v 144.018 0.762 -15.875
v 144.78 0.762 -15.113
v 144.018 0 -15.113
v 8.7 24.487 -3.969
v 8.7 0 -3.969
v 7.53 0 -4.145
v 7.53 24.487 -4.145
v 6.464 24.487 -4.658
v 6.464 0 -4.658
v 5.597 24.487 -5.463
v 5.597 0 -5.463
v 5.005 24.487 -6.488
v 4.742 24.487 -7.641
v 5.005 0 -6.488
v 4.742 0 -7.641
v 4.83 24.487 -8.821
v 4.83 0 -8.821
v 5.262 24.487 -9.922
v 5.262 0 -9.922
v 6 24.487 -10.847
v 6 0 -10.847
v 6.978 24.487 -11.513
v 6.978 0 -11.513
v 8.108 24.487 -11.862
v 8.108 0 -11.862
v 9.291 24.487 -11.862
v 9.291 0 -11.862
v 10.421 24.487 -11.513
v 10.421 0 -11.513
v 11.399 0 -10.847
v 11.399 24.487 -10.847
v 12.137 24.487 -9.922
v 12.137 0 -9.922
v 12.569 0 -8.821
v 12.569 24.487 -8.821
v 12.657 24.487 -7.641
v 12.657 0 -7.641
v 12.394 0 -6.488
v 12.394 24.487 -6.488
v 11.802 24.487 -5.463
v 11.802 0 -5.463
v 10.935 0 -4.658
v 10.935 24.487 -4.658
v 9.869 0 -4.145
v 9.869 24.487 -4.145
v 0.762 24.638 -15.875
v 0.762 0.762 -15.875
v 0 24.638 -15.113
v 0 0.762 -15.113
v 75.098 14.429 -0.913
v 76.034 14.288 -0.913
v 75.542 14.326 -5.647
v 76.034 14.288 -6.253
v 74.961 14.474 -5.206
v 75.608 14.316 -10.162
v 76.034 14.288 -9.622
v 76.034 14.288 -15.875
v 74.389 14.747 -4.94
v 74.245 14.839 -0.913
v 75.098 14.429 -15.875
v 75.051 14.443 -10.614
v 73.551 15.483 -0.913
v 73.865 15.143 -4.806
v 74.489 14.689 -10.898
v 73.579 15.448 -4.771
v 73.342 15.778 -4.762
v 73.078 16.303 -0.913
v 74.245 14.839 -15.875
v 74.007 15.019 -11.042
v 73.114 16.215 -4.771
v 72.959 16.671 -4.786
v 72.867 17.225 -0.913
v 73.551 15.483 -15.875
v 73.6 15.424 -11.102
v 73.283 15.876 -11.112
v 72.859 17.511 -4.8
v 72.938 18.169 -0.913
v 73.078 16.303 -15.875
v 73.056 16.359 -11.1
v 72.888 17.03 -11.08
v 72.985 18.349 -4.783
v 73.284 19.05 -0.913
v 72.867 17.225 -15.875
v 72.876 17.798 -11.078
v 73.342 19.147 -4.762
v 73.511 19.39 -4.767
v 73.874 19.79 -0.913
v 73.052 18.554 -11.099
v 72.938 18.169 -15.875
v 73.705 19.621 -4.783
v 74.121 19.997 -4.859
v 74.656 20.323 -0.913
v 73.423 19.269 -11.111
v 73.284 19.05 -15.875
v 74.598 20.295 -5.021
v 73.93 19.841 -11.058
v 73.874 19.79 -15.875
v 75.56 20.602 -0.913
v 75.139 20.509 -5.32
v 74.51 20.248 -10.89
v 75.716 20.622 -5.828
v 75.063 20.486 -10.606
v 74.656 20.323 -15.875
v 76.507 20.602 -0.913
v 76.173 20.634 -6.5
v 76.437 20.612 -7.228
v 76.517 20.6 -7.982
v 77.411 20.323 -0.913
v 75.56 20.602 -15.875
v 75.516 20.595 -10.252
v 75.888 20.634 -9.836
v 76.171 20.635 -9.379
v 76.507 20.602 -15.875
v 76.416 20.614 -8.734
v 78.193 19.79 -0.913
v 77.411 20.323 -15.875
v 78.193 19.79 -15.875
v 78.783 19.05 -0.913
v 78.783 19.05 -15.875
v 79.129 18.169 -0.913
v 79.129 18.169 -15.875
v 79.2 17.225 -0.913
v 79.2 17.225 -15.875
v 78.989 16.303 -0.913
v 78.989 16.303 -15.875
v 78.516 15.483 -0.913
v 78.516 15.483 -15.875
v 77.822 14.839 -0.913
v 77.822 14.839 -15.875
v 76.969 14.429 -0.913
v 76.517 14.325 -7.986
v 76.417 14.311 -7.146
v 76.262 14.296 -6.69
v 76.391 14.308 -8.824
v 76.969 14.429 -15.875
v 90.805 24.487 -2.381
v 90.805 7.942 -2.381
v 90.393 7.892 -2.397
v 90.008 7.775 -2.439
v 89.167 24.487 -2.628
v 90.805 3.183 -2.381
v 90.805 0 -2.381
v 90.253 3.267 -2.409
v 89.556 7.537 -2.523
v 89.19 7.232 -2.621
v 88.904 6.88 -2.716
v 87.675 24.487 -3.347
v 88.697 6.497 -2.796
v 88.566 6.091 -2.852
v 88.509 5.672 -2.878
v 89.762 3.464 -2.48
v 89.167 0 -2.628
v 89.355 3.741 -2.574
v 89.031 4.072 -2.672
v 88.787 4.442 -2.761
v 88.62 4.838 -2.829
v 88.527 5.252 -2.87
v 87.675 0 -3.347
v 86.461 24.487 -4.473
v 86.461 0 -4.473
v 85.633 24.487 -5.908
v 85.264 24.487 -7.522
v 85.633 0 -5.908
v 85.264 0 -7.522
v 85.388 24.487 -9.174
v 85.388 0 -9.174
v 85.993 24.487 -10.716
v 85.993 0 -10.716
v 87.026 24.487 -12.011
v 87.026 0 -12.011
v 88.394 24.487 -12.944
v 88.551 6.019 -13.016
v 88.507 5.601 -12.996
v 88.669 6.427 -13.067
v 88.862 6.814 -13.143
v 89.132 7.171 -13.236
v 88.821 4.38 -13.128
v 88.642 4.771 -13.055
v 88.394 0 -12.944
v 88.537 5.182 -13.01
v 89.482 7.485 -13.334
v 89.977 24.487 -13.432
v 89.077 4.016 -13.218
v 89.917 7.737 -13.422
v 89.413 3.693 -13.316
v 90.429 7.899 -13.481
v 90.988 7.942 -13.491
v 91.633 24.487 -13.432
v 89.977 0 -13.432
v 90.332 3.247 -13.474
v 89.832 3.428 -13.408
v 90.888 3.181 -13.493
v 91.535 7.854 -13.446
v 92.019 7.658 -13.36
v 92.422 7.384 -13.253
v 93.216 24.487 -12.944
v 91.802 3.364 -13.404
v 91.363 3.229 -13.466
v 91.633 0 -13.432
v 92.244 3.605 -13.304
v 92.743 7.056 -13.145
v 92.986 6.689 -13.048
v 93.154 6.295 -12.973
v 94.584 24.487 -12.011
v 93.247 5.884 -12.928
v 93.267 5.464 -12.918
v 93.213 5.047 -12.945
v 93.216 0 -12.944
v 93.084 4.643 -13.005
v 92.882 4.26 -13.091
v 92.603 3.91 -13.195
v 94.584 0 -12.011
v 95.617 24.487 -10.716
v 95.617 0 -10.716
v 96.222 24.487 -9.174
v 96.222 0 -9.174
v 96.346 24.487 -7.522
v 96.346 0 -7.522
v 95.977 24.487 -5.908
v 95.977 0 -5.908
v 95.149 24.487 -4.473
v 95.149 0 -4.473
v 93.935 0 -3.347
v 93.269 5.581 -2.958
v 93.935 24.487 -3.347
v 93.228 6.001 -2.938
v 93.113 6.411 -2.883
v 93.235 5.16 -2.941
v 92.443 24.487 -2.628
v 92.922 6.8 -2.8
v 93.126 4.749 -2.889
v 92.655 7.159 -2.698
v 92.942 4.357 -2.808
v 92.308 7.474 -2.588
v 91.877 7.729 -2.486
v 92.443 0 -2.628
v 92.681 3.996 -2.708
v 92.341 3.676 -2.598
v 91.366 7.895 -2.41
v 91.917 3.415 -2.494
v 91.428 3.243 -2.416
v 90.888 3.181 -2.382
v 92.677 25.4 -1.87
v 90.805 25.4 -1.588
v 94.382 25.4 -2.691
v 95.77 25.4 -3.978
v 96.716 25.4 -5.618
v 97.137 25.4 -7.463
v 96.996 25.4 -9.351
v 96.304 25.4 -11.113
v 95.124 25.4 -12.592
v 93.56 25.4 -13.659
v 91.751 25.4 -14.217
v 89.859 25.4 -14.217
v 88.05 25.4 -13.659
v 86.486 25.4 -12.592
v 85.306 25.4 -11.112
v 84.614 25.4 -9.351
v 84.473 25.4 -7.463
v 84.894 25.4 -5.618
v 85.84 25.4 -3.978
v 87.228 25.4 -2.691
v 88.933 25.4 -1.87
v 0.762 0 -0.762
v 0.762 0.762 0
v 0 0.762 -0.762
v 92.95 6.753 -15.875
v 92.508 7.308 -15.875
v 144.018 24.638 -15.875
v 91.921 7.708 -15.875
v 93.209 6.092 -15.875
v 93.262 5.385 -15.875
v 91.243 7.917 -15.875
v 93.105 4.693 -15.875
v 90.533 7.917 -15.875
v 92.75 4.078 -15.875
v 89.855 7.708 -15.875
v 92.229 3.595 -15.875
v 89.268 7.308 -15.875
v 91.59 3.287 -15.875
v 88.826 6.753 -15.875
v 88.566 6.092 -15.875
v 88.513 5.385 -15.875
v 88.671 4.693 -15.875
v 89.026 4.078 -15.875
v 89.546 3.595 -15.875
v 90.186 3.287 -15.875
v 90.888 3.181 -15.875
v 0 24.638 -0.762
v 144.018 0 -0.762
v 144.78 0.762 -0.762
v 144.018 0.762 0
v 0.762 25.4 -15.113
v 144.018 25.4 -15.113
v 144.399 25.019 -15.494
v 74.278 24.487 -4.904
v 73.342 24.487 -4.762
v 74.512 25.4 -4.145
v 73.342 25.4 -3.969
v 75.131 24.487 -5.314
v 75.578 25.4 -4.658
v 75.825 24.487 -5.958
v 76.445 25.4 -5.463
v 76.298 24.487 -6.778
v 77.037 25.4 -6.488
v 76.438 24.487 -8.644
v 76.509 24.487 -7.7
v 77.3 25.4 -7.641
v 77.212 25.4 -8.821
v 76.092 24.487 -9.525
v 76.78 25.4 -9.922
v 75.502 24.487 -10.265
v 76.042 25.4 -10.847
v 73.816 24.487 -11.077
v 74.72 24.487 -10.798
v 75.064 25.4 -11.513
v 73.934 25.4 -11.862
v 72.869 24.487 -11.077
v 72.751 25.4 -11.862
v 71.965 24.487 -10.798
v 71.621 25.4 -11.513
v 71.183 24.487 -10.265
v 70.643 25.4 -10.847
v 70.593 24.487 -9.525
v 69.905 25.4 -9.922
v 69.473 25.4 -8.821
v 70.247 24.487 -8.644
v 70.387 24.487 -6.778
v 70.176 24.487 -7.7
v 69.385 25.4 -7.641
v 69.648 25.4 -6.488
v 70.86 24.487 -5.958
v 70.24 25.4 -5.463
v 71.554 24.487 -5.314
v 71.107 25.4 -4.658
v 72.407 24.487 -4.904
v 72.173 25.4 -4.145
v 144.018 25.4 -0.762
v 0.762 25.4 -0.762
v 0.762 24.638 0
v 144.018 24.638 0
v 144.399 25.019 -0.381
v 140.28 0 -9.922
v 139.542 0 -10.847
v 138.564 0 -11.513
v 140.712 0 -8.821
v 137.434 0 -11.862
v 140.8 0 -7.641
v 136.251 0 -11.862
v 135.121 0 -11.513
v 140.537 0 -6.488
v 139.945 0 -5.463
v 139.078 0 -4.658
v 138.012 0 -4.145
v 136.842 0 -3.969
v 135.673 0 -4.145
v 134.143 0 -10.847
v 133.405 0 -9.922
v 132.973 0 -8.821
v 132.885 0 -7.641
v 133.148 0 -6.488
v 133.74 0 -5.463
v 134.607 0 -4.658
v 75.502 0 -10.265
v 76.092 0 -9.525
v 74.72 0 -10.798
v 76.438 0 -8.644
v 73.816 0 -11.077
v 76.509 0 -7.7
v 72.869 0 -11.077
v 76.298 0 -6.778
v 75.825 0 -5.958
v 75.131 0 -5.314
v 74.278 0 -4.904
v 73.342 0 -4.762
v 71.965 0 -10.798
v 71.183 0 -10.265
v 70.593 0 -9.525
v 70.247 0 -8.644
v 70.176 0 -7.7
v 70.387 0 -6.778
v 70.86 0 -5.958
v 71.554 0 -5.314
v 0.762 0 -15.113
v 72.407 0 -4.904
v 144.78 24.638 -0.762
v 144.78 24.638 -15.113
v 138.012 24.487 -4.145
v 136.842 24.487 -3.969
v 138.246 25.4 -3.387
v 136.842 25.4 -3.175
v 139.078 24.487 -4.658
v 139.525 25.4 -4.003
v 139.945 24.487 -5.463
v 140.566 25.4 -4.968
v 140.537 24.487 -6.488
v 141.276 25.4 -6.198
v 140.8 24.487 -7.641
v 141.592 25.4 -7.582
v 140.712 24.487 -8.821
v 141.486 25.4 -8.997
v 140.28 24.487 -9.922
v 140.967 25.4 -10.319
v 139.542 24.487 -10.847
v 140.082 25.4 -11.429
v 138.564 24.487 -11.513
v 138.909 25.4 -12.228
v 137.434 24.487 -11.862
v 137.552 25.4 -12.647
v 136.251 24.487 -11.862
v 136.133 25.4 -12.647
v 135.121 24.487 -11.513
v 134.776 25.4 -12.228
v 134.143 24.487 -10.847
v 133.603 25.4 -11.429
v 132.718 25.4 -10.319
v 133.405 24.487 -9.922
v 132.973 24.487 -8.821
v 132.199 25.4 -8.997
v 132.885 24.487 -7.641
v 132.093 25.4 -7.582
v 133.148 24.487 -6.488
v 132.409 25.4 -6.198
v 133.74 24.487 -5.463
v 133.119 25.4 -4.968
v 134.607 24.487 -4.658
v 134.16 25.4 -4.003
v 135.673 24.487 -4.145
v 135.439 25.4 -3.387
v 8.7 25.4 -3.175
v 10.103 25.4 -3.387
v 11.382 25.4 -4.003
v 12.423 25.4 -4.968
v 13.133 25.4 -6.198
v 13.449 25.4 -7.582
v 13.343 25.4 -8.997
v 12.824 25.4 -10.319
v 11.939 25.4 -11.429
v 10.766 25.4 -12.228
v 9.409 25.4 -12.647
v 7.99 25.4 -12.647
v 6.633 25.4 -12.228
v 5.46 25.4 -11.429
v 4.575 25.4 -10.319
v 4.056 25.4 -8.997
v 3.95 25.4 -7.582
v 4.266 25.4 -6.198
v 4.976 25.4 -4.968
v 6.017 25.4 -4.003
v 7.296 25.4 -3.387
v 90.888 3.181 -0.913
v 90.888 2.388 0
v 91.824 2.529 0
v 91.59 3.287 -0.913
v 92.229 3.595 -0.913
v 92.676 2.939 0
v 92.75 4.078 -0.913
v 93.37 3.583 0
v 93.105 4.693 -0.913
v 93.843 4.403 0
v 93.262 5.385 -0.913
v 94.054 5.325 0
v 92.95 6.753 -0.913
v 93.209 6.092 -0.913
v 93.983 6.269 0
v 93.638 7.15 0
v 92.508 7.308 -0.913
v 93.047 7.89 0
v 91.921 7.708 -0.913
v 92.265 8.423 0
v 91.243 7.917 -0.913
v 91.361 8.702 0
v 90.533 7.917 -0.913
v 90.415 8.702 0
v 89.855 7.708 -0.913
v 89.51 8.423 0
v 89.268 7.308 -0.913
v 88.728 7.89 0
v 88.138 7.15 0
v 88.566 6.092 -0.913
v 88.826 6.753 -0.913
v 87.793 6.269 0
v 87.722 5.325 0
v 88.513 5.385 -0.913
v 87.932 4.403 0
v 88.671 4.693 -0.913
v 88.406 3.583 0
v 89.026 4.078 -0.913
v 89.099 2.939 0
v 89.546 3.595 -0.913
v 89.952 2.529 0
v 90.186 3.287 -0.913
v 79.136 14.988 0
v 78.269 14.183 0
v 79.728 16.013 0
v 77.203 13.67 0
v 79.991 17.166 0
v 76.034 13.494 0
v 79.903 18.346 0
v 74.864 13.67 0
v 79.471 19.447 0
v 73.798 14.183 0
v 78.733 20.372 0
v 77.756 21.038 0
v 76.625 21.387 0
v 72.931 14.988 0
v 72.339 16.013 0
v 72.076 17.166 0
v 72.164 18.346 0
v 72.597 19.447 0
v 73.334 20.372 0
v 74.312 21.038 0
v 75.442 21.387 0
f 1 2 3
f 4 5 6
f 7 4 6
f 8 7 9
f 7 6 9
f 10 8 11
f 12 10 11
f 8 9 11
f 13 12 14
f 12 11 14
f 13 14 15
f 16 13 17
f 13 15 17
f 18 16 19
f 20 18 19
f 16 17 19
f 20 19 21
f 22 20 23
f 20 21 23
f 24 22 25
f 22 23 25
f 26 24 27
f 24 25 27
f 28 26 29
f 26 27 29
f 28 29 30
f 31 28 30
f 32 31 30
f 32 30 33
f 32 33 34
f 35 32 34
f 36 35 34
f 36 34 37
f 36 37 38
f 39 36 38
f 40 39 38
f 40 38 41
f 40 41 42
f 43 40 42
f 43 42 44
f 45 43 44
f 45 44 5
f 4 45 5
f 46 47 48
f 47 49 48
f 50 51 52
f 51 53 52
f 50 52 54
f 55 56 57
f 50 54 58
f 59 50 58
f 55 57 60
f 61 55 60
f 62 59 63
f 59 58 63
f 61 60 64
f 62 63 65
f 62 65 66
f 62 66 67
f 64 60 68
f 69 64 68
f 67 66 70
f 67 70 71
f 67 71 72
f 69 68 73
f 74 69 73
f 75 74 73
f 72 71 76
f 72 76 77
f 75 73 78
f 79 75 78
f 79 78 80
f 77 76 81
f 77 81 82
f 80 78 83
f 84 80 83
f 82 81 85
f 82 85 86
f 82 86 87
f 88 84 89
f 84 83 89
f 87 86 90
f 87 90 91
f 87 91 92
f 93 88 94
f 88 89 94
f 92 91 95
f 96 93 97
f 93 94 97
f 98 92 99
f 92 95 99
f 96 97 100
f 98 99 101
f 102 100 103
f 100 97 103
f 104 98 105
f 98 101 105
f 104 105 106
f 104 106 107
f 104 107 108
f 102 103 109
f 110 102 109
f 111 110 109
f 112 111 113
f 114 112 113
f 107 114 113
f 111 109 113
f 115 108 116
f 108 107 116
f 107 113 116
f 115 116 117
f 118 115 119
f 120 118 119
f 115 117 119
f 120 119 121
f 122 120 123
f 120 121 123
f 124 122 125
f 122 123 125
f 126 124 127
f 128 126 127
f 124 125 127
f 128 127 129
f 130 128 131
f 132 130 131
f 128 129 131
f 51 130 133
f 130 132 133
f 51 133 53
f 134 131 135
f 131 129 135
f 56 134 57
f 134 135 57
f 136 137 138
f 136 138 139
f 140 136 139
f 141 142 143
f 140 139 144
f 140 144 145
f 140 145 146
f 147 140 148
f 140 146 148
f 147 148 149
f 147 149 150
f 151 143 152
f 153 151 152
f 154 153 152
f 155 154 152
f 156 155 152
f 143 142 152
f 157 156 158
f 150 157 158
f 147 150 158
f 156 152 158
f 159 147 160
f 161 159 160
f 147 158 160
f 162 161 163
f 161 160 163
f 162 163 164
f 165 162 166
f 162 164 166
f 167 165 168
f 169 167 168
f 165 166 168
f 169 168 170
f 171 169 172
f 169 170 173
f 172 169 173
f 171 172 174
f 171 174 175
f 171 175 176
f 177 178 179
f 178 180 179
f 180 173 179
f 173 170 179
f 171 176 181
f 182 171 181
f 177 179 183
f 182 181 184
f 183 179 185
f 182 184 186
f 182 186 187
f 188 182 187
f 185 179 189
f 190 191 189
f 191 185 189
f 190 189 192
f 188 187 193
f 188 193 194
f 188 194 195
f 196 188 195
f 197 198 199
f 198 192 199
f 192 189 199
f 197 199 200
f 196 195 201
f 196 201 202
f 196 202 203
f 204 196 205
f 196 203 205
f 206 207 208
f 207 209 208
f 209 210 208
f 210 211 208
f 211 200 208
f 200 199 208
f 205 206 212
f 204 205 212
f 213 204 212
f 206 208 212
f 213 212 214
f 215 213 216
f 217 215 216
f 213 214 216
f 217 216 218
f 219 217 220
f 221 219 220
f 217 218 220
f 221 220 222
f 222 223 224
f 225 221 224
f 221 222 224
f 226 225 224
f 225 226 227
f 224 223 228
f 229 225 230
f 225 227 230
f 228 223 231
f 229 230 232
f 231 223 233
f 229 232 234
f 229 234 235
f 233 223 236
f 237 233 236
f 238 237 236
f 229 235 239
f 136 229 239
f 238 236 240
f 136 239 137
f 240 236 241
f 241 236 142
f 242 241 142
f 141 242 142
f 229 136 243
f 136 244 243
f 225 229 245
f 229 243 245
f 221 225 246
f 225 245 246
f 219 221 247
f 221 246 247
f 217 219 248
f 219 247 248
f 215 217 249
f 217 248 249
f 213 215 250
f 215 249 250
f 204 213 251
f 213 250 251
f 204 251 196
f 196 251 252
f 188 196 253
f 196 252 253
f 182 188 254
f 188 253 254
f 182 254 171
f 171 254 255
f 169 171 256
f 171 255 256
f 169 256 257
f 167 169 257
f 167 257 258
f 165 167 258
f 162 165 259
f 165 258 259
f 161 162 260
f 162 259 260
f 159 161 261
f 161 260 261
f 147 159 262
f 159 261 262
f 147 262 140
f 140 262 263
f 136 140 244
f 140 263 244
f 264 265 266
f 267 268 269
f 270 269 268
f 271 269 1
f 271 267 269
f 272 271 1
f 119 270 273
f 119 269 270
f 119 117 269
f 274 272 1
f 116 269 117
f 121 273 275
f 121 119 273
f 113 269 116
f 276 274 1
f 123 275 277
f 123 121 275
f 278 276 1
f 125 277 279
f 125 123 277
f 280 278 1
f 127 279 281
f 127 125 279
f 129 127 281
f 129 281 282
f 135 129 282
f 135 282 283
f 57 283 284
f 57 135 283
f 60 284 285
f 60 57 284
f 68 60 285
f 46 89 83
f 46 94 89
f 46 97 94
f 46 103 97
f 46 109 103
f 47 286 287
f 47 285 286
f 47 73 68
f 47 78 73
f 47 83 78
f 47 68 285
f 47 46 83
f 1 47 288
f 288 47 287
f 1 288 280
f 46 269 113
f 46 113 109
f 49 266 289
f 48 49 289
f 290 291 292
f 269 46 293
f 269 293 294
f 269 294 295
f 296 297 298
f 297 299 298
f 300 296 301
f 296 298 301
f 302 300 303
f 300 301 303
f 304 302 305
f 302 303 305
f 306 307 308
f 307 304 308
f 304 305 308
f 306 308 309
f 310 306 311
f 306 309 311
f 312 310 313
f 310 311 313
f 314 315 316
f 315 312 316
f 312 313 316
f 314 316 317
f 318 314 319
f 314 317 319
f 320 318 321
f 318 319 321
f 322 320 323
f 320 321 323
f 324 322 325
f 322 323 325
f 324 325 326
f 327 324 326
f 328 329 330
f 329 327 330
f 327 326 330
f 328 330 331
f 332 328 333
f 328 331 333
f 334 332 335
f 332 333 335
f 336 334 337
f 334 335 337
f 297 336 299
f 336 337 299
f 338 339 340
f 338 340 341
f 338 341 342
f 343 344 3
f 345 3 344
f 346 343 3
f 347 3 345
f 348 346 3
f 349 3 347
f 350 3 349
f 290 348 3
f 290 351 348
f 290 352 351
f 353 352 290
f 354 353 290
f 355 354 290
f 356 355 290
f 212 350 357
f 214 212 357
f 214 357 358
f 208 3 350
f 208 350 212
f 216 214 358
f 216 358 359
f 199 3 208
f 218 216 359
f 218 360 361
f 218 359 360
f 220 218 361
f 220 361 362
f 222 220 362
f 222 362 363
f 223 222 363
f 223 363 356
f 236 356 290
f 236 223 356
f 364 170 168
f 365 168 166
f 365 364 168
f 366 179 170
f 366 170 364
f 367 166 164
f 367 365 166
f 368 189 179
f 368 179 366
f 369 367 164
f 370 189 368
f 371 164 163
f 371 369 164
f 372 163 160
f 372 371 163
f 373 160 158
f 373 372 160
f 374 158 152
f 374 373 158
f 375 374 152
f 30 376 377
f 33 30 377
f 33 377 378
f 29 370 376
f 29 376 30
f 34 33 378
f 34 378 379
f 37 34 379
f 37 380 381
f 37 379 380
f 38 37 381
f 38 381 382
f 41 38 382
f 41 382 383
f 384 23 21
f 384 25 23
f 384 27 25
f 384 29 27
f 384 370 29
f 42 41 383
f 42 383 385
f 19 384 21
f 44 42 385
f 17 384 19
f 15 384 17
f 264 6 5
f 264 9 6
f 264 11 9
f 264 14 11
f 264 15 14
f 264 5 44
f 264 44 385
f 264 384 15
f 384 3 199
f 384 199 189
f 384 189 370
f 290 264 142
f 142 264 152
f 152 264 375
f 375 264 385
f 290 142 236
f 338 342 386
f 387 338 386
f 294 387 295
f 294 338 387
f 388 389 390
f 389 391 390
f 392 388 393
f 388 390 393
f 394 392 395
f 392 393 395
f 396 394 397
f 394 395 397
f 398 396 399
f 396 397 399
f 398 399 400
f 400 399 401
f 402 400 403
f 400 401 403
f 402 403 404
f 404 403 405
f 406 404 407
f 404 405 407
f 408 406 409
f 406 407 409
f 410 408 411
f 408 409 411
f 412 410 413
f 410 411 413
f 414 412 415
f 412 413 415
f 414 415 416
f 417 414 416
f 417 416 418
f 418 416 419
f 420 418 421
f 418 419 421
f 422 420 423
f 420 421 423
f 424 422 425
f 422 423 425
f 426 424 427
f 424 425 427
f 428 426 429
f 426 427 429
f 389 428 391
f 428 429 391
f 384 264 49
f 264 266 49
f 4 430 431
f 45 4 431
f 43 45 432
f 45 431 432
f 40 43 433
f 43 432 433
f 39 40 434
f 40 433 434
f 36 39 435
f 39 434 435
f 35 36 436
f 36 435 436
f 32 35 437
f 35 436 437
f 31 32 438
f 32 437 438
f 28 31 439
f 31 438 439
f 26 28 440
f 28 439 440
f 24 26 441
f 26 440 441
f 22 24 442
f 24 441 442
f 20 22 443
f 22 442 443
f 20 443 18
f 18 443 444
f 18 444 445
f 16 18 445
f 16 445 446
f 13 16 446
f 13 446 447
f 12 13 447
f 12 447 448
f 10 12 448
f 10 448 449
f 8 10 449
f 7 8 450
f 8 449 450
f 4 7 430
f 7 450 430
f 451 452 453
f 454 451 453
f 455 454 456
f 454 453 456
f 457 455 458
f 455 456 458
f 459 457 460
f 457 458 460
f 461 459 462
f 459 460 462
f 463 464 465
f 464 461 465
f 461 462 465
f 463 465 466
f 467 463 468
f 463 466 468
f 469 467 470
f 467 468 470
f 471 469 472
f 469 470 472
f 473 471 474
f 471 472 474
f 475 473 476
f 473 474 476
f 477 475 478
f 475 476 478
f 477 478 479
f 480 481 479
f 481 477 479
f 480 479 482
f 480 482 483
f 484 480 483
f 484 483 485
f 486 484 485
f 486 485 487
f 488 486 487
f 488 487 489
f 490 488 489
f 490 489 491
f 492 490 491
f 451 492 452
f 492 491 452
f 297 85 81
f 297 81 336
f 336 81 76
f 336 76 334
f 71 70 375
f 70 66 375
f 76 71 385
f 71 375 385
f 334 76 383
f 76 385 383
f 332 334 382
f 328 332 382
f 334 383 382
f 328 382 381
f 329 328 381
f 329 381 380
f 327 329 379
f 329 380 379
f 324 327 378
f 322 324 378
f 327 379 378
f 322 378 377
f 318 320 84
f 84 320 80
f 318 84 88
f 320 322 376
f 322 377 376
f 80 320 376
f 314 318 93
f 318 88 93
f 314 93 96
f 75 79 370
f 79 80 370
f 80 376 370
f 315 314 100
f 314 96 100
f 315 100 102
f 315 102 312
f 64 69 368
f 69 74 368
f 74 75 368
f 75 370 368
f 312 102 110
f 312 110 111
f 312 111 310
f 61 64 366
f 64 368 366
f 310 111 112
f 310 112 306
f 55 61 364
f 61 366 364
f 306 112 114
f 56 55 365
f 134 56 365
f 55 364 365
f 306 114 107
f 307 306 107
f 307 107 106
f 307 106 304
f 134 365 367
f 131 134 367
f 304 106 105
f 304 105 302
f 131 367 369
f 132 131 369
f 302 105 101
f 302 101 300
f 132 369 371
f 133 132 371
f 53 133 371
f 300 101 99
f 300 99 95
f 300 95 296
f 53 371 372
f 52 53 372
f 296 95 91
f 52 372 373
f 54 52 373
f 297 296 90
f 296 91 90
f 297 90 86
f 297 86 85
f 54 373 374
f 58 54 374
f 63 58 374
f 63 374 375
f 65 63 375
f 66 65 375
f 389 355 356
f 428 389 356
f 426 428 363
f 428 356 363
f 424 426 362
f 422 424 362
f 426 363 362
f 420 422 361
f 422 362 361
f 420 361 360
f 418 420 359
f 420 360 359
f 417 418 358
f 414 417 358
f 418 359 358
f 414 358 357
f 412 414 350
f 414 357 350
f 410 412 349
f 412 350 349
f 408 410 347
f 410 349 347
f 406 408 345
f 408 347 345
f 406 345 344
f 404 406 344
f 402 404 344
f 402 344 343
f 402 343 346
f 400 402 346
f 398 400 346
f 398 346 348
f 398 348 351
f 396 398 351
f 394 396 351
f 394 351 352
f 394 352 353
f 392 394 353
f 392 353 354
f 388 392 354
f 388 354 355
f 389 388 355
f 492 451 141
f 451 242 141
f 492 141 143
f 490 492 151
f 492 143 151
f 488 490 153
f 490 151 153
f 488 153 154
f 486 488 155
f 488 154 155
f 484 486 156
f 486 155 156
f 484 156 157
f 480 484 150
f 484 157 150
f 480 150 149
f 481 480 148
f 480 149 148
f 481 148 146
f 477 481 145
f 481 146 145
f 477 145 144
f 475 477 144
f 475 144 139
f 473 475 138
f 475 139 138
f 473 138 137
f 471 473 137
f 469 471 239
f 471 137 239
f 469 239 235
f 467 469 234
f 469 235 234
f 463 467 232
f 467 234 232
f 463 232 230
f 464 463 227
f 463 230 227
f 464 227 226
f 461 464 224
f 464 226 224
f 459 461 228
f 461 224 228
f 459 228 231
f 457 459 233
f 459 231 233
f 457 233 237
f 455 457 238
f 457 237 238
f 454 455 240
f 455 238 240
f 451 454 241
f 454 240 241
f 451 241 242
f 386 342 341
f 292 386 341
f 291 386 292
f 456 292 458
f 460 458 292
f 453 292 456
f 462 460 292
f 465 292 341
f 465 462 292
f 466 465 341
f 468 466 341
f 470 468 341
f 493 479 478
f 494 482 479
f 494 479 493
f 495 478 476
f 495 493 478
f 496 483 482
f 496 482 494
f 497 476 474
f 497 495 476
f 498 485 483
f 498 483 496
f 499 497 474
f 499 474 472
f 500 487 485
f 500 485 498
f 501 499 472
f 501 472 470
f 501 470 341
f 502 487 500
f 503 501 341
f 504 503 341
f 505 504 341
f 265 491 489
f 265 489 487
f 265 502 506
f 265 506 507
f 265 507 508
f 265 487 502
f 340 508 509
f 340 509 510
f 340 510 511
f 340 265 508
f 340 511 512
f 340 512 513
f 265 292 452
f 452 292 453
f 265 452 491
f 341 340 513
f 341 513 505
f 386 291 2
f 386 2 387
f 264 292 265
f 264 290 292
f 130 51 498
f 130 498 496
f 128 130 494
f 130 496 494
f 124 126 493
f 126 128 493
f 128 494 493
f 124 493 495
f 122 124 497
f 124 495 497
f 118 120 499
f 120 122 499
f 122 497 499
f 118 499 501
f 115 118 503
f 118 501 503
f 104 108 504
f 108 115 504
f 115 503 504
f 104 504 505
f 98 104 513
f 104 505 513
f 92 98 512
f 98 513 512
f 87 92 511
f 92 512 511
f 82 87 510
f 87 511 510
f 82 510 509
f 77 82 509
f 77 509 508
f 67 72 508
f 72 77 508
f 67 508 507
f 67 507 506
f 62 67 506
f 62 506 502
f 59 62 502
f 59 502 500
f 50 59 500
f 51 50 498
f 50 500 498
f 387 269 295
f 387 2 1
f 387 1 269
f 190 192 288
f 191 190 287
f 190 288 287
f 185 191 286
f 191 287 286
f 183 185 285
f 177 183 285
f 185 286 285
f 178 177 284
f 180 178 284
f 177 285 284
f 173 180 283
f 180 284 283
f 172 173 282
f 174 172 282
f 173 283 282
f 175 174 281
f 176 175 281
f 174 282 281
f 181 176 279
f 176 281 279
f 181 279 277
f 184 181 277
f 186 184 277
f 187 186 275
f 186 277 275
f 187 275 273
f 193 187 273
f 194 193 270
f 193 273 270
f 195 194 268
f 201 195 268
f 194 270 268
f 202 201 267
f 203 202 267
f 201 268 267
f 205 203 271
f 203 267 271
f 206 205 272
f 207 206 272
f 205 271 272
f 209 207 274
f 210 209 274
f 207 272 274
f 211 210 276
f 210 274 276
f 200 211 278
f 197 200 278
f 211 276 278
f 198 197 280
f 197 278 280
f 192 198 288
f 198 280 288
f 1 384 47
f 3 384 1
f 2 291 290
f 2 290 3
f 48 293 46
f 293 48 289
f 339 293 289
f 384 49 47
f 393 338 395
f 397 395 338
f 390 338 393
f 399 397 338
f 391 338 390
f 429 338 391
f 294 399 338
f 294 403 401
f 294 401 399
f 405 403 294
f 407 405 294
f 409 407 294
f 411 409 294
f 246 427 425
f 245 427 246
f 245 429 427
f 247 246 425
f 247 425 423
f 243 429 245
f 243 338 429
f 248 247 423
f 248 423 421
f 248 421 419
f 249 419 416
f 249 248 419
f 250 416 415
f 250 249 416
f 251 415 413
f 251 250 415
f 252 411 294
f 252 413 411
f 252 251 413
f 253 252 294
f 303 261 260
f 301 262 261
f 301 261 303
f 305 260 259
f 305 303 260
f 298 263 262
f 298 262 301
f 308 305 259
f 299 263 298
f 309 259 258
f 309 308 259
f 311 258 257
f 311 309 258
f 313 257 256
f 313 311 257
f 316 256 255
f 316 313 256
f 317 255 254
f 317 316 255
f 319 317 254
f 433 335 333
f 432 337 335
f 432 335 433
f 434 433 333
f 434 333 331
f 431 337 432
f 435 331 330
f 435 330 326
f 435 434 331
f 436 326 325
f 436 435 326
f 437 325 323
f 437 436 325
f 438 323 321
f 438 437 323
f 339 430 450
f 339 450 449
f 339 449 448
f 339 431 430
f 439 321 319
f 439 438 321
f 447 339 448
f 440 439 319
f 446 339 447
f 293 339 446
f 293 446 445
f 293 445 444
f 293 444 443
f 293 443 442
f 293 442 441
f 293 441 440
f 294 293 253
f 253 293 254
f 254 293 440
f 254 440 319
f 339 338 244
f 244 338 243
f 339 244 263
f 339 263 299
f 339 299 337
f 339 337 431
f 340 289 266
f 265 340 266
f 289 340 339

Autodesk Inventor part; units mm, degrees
ref_plane "YZ Plane" through (0, 0, 0) normal (1, 0, 0) x (0, 1, 0)
ref_plane "XZ Plane" through (0, 0, 0) normal (0, 1, 0) x (-1, 0, 0)
ref_plane "XY Plane" through (0, 0, 0) normal (0, 0, 1) x (1, 0, 0)
sketch "Sketch1" plane through (0, 0, 0) normal (1, 0, 0) x (0, 1, 0)
  line L0 (0, 0) -> (25.4, 0)
  line L1 (25.4, 0) -> (25.4, -15.875)
  line L2 (25.4, -15.875) -> (0, -15.875)
  line L3 (0, -15.875) -> (0, 0)
  dimension "d0" = 25.4
  dimension "d1" = 15.875
extrude "Extrusion1" add sketch "Sketch1" along normal blind 144.78
chamfer "Chamfer1" distance 0.762 angle 45 11 edges at (144.78, 12.7, 0) (144.78, 12.7, -15.875) (144.78, 0, -7.9375) (72.39, 0, 0) (72.39, 25.4, 0) (72.39, 25.4, -15.875) (0, 12.7, 0) (0, 25.4, -7.9375) (0, 12.7, -15.875) (0, 0, -7.9375) (72.39, 0, -15.875)
sketch "Sketch2" plane through (0.762, 25.4, -15.113) normal (0, 1, 0) x (1, 0, 0)
  line L0 (0, -15.113) -> (143.256, -15.113) projected
  line L1 (0, -15.113) -> (7.9375, -15.113)
  line L2 (7.9375, -15.113) -> (7.9375, -7.1755)
  point P0 (-0.762, -15.113)
  dimension "d7" = 7.9375
  dimension "d8" = 7.9375
hole "Hole1" at (8.6995, 25.4, -7.9375) direction (0, -1, 0) diameter 7.9375 end through all countersink diameter 9.525 countersink angle 82
sketch "Sketch3" plane through (0.762, 25.4, -15.113) normal (0, 1, 0) x (1, 0, 0)
  line L0 (144.018, 0) -> (144.018, -14.351) projected
  line L1 (144.018, -7.1755) -> (72.5805, -7.1755)
  point P0 (-0.762, -15.113)
  dimension "d16" = 71.4375
hole "Hole2" at (73.3425, 25.4, -7.9375) direction (0, -1, 0) diameter 6.35 end through all countersink diameter 7.9375 countersink angle 82
sketch "Sketch4" plane through (0.762, 25.4, -15.113) normal (0, 1, 0) x (1, 0, 0)
  line L0 (144.018, 0) -> (144.018, -14.351) projected
  line L1 (144.018, -7.1755) -> (90.043, -7.1755)
  point P0 (-0.762, -15.113)
  dimension "d24" = 53.975
hole "Hole3" at (90.805, 25.4, -7.9375) direction (0, -1, 0) diameter 11.1125 end through all countersink diameter 12.7 countersink angle 82
sketch "Sketch5" plane through (0.762, 25.4, -15.113) normal (0, 1, 0) x (1, 0, 0)
  line L0 (144.018, 0) -> (144.018, -14.351) projected
  line L1 (144.018, -7.1755) -> (136.0805, -7.1755)
  point P0 (-0.762, -15.113)
  dimension "d32" = 7.9375
hole "Hole4" at (136.8425, 25.4, -7.9375) direction (0, -1, 0) diameter 7.9375 end through all countersink diameter 9.525 countersink angle 82
sketch "Sketch6" plane through (0.762, 0.762, 0) normal (0, 0, 1) x (1, 0, 0)
  line L0 (111.9534, -0.762) -> (111.9534, 4.8006) construction
  line L1 (117.1134, 4.8006) -> (90.1259, 4.8006) construction
  point P0 (-0.762, -0.762)
  dimension "d40" = 5.5626
  dimension "d41" = 26.9875
hole "Hole5" at (90.8879, 5.5626, 0) direction (0, 0, -1) diameter 4.7625 end through all countersink diameter 6.35 countersink angle 82
sketch "Sketch7" plane through (0.762, 0.762, 0) normal (0, 0, 1) x (1, 0, 0)
  line L0 (114.57, -0.762) -> (114.57, 16.7005)
  line L1 (116.5466, 16.7005) -> (75.2716, 16.7005)
  point P0 (-0.762, -0.762)
  dimension "d49" = 17.4625
  dimension "d50" = 41.275
hole "Hole6" at (76.0336, 17.4625, 0) direction (0, 0, -1) diameter 6.35 end through all countersink diameter 7.9375 countersink angle 82
chamfer "Chamfer2" distance 0.762 angle 45 1 edges at (144.78, 25.4, -7.9375)
properties part number "holes1"
